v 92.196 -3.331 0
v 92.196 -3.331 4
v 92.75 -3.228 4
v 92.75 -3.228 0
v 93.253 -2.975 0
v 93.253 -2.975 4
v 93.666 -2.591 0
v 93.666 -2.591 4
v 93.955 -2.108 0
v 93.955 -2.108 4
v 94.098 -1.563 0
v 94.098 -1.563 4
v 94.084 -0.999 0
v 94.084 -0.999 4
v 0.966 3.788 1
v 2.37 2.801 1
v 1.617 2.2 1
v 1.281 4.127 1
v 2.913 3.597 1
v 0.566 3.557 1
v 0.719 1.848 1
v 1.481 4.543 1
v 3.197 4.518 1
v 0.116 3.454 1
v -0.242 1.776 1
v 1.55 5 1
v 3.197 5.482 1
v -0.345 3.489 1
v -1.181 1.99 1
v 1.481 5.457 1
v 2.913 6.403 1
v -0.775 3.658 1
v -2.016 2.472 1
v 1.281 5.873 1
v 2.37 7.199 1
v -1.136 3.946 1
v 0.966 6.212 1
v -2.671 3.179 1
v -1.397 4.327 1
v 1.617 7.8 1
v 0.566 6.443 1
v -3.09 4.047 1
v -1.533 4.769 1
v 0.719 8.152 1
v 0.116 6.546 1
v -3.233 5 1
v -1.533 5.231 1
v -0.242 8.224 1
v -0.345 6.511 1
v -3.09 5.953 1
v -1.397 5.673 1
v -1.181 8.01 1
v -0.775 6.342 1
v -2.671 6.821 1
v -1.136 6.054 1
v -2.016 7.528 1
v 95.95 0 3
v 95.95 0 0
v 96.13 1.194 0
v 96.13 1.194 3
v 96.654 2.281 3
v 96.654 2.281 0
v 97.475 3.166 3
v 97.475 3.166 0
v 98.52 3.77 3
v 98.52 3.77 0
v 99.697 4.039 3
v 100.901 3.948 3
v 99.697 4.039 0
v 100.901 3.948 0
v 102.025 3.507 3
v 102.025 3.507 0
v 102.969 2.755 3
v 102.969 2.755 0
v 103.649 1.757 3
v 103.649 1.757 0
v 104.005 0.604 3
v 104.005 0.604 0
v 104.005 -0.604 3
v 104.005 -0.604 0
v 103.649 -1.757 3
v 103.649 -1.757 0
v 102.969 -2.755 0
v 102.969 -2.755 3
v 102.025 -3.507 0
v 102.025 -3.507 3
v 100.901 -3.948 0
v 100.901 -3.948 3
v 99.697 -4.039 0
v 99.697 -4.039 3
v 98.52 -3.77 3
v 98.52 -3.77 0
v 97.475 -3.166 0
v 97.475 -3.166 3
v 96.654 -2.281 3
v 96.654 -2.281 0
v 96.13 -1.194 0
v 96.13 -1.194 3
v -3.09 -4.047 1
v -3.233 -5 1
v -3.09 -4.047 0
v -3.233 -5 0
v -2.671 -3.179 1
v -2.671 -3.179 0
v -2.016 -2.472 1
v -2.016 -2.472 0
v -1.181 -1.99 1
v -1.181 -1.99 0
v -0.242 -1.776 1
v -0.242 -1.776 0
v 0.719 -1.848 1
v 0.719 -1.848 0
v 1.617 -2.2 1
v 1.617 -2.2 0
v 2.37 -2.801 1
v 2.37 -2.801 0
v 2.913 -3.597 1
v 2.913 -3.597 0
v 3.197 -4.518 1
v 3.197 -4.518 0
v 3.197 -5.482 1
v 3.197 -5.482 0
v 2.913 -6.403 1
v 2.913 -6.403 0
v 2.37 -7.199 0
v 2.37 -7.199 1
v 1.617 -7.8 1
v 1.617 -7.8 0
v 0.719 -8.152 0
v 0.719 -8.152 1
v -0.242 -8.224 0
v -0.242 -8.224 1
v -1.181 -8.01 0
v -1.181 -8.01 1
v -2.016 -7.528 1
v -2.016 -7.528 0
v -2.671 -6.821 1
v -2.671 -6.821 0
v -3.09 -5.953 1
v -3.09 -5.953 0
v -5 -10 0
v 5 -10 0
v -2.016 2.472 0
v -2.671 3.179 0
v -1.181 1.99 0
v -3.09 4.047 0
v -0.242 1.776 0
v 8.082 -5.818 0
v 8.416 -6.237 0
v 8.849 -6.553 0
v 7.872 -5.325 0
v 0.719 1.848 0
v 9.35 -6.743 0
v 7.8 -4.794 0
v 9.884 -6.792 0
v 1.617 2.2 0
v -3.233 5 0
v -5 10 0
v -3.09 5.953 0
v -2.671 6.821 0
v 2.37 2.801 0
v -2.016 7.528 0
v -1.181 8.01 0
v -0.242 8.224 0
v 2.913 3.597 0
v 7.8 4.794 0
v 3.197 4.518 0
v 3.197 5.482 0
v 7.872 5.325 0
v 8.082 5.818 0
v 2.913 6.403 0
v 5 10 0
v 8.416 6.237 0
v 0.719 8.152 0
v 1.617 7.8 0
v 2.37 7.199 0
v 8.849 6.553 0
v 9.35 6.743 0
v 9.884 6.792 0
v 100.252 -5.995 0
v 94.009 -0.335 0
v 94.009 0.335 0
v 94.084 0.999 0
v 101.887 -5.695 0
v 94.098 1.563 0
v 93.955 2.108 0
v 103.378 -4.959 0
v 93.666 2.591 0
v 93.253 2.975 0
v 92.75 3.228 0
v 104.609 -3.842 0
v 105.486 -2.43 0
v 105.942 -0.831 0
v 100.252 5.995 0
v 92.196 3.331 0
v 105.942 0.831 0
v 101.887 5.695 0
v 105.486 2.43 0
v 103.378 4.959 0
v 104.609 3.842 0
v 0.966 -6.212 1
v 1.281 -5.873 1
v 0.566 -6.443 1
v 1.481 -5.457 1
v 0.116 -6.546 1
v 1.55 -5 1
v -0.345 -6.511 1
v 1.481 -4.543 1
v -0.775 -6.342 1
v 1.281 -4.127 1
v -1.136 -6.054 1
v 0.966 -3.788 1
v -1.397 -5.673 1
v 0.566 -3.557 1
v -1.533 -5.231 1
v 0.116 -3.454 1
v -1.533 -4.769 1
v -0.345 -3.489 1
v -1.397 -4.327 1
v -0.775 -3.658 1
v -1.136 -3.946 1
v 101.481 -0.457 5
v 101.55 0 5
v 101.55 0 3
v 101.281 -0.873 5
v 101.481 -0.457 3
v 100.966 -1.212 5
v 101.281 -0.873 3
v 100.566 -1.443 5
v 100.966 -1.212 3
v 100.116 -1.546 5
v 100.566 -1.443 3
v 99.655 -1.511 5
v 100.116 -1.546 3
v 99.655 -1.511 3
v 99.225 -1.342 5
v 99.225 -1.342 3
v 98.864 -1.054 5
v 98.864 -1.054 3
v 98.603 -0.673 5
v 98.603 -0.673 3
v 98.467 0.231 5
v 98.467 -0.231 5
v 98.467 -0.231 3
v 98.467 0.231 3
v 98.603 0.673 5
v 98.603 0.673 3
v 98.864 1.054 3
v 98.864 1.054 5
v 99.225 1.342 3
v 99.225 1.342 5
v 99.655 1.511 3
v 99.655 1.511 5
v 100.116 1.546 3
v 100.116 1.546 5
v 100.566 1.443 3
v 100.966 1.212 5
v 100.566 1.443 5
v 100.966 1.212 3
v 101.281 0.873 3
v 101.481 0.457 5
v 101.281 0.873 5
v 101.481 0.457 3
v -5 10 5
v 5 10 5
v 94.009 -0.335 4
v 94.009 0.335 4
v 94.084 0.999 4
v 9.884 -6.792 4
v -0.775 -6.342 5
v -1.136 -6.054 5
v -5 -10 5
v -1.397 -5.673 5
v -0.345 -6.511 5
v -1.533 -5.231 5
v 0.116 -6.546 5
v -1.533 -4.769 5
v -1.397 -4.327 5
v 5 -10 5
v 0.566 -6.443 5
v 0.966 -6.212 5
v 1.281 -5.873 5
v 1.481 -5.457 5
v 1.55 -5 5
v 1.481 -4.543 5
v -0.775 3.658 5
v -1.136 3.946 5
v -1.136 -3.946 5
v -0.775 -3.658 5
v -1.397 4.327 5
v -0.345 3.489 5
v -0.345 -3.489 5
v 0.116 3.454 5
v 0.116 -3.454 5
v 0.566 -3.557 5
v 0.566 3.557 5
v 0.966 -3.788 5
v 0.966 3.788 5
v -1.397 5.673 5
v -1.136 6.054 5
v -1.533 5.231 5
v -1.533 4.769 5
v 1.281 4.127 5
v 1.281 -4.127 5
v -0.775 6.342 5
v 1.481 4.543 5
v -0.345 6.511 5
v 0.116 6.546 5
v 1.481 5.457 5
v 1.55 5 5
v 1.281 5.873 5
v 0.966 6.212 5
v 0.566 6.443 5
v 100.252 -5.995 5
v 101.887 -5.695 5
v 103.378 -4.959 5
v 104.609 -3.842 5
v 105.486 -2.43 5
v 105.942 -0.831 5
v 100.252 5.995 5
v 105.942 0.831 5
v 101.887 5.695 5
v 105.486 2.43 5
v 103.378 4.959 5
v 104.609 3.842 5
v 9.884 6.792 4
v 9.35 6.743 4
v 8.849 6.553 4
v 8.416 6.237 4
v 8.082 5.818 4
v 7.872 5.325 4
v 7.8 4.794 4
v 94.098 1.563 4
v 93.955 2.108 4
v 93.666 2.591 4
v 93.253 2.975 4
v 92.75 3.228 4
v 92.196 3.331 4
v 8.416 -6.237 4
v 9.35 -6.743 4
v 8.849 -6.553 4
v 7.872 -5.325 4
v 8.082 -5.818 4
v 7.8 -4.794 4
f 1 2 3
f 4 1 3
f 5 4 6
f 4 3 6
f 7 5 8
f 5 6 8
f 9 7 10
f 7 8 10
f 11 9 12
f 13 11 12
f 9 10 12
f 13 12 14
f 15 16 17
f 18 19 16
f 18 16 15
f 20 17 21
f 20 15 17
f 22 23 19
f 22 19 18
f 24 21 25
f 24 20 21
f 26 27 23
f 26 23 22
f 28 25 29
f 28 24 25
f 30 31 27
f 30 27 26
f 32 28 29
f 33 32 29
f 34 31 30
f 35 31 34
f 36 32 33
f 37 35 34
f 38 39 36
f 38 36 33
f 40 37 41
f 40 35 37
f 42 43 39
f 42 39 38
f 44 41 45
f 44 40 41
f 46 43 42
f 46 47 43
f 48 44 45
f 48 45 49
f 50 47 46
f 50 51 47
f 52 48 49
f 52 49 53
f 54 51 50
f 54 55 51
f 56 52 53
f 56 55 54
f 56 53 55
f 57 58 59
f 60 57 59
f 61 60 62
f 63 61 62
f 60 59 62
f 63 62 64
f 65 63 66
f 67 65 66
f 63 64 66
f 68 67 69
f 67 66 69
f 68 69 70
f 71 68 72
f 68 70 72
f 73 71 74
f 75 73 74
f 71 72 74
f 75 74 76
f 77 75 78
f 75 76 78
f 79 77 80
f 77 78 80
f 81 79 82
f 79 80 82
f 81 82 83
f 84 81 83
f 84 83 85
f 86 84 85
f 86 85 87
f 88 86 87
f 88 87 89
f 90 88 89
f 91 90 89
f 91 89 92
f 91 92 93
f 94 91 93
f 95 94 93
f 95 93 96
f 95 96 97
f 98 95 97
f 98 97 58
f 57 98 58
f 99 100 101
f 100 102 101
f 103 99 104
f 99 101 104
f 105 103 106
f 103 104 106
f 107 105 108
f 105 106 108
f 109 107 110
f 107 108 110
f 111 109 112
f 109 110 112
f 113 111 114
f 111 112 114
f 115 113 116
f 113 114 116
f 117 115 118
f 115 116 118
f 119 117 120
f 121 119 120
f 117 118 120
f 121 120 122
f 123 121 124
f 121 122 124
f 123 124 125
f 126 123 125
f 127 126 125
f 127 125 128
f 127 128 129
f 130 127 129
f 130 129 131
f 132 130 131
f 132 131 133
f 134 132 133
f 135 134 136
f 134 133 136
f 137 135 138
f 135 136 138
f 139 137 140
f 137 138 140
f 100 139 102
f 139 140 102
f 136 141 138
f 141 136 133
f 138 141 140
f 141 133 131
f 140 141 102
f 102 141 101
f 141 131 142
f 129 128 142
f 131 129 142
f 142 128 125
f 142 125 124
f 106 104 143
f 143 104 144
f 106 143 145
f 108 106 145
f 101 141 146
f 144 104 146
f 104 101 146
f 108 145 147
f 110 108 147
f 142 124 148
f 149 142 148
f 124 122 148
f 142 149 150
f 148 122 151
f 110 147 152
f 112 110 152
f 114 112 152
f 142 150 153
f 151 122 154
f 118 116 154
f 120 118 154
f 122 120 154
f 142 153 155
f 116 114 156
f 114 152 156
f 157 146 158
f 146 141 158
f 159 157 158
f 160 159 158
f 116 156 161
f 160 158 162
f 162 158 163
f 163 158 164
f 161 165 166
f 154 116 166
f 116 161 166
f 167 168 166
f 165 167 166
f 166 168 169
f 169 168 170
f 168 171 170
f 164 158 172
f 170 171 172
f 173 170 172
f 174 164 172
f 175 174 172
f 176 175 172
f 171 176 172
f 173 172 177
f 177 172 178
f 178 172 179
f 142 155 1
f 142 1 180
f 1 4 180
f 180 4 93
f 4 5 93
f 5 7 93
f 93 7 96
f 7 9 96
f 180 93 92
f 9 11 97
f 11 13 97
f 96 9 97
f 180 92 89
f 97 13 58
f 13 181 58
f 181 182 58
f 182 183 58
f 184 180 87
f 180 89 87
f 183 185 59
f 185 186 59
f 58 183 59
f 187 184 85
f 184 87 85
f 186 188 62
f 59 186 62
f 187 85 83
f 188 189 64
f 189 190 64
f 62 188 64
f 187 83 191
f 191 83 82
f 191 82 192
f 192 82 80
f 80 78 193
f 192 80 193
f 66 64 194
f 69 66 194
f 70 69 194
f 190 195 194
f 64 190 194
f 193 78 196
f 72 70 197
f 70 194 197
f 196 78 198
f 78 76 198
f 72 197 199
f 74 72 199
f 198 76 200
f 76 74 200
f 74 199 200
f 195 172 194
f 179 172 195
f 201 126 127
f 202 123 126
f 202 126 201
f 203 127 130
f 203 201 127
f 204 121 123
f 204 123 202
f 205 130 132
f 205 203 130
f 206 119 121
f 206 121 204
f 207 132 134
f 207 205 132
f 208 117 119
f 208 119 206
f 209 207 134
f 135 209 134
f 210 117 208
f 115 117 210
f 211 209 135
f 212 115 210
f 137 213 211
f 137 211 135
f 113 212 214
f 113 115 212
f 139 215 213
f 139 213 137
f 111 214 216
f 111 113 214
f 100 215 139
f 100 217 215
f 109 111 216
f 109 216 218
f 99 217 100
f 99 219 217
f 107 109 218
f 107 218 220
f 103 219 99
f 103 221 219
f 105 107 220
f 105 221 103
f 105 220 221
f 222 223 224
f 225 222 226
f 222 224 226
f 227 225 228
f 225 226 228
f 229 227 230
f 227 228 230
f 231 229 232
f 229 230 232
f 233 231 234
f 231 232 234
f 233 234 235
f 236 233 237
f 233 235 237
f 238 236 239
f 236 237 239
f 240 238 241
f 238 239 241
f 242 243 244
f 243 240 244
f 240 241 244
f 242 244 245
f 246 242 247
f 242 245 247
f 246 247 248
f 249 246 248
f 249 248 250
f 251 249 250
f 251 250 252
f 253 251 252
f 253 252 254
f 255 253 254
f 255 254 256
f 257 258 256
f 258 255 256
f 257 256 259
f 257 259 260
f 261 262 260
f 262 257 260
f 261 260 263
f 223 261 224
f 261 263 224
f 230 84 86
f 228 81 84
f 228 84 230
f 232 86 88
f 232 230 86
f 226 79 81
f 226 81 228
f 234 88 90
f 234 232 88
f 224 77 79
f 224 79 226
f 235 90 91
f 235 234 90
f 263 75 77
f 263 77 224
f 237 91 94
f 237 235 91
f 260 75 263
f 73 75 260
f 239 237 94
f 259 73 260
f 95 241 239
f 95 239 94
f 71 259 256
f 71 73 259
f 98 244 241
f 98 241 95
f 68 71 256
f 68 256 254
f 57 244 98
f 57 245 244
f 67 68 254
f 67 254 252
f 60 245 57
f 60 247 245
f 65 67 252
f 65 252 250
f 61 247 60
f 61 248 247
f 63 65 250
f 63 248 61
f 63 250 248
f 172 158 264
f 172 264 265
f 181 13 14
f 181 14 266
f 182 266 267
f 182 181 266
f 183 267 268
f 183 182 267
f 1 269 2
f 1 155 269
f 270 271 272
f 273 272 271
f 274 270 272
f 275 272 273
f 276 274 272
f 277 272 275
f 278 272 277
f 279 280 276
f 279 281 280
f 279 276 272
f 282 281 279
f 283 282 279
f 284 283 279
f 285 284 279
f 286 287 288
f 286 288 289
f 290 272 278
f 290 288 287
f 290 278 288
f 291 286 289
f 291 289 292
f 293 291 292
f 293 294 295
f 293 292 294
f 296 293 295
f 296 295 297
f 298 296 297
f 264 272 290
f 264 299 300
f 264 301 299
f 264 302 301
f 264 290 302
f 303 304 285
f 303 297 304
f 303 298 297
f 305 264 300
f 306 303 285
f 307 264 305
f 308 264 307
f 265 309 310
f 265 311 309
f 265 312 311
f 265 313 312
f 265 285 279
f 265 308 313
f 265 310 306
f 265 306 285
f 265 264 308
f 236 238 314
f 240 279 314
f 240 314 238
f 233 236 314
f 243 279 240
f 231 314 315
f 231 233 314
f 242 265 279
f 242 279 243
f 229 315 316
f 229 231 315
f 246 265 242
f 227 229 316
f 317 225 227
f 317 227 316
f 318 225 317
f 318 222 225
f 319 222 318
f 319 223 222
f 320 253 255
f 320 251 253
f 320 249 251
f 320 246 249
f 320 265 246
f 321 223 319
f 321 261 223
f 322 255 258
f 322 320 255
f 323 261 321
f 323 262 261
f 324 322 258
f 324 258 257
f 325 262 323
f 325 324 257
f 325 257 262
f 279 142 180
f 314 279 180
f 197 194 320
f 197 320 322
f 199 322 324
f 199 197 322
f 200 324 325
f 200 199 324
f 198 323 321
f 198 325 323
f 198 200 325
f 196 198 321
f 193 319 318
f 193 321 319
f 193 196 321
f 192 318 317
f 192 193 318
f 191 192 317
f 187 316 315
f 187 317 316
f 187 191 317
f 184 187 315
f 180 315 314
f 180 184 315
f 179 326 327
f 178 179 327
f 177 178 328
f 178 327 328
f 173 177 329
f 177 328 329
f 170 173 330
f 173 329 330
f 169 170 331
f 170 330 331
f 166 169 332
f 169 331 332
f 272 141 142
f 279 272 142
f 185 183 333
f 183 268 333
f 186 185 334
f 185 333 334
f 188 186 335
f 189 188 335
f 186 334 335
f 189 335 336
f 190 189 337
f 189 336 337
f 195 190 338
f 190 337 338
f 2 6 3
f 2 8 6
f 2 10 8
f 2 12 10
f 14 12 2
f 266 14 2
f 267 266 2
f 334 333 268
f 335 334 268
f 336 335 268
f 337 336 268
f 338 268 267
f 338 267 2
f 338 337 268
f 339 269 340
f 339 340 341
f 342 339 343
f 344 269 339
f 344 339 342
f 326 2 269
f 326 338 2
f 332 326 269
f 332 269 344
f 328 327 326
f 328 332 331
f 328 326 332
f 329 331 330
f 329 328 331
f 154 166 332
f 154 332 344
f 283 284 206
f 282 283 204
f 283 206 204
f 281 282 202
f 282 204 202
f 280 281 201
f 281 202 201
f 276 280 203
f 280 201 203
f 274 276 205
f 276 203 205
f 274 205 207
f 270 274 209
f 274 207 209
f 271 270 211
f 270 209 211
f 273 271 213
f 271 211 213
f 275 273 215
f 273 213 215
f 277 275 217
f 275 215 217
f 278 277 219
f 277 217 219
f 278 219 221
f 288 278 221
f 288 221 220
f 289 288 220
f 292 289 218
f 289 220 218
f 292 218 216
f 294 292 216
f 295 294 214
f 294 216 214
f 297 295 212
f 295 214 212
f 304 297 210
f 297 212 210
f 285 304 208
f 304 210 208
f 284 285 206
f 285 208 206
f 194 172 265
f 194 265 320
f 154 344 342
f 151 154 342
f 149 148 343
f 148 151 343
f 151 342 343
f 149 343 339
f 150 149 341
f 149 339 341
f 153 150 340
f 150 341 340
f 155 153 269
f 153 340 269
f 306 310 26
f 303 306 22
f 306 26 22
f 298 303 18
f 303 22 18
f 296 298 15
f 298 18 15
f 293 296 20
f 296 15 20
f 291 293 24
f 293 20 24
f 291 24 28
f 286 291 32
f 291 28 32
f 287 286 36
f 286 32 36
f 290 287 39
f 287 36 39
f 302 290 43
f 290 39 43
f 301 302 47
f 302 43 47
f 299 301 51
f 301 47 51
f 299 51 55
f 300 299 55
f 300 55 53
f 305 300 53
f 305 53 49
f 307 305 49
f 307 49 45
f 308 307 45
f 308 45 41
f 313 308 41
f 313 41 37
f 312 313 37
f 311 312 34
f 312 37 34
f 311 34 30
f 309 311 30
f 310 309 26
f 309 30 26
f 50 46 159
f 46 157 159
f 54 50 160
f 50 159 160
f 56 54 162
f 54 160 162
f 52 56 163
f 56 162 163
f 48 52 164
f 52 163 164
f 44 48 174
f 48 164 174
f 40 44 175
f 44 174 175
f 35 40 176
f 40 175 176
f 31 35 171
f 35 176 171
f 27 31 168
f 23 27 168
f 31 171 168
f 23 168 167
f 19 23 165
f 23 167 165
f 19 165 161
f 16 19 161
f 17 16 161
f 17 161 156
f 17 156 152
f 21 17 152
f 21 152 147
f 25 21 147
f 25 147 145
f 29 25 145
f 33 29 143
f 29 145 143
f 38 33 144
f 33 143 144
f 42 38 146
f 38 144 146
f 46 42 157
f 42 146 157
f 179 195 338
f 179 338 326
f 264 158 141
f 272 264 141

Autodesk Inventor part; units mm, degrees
ref_plane "YZ Plane" through (0, 0, 0) normal (1, 0, 0) x (0, 1, 0)
ref_plane "XZ Plane" through (0, 0, 0) normal (0, 1, 0) x (-1, 0, 0)
ref_plane "XY Plane" through (0, 0, 0) normal (0, 0, 1) x (1, 0, 0)
sketch "スケッチ1" plane through (0, 0, 0) normal (0, 0, 1) x (1, 0, 0)
  circle A0 centre (0, 5) radius 1.55
  circle A1 centre (0, -5) radius 1.55
  line L0 (0, 5) -> (0, -5) construction
  line L1 (0, 0) -> (100, 0) construction
  circle A2 centre (100, 0) radius 1.55
  line L2 (-5, 10) -> (-5, -10)
  line L3 (-5, -10) -> (5, -10)
  line L4 (5, -10) -> (100.2521, -5.9947)
  line L5 (-5, 10) -> (5, 10)
  line L6 (5, 10) -> (100.2521, 5.9947)
  arc A3 (100.2521, -5.9947) -> (100.2521, 5.9947) centre (100, 0) ccw
  circle A4 centre (0, 5) radius 3 construction
  circle A5 centre (0, 5) radius 5 construction
  line L7 (5, 10) -> (5, -10) construction
  point P0 (-5, 0)
  dimension "d0" = 10
  dimension "d1" = 3.1
  dimension "d2" = 3.1
  dimension "d3" = 100
  dimension "d4" = 6
  dimension "d5" = 6
  dimension "d6" = 2
extrude "押し出し1" add sketch "スケッチ1" along normal blind 5
sketch "スケッチ2" plane through (0, 0, 0) normal (0, 0, -1) x (-1, 0, 0)
  circle A0 centre (-100, 0) radius 1.55 projected
  arc A1 (-100.2521, 5.9947) -> (-100.2521, -5.9947) centre (-100, 0) ccw projected
  circle A2 centre (-100, 0) radius 4.05
  point P0 (0, 0)
  dimension "d9" = 8.1
extrude "押し出し2" cut sketch "スケッチ2" against normal blind 3
sketch "スケッチ3" plane through (0, 0, 0) normal (0, 0, -1) x (-1, 0, 0)
  circle A0 centre (0, -5) radius 1.55 projected
  circle A1 centre (0, 5) radius 1.55 projected
  line L0 (0, -1.8246) -> (2.75, -3.4123)
  line L1 (2.75, -3.4123) -> (2.75, -6.5877)
  line L2 (2.75, -6.5877) -> (0, -8.1754)
  line L3 (0, -8.1754) -> (-2.75, -6.5877)
  line L4 (-2.75, -6.5877) -> (-2.75, -3.4123)
  line L5 (-2.75, -3.4123) -> (0, -1.8246)
  line L6 (-2.75, 6.5877) -> (0, 8.1754)
  line L7 (0, 8.1754) -> (2.75, 6.5877)
  line L8 (2.75, 6.5877) -> (2.75, 3.4123)
  line L9 (2.75, 3.4123) -> (0, 1.8246)
  line L10 (0, 1.8246) -> (-2.75, 3.4123)
  line L11 (-2.75, 3.4123) -> (-2.75, 6.5877)
  line L12 (0, -8.2332) -> (2.8, -6.6166)
  line L13 (2.8, -6.6166) -> (2.8, -3.3834)
  line L14 (2.8, -3.3834) -> (0, -1.7668)
  line L15 (0, -1.7668) -> (-2.8, -3.3834)
  line L16 (-2.8, -3.3834) -> (-2.8, -6.6166)
  line L17 (-2.8, -6.6166) -> (0, -8.2332)
  line L18 (-2.8, 3.3834) -> (0, 1.7668)
  line L19 (0, 1.7668) -> (2.8, 3.3834)
  line L20 (2.8, 3.3834) -> (2.8, 6.6166)
  line L21 (2.8, 6.6166) -> (0, 8.2332)
  line L22 (0, 8.2332) -> (-2.8, 6.6166)
  line L23 (-2.8, 6.6166) -> (-2.8, 3.3834)
  circle A2 centre (0, -7.1832) radius 1.05
  circle A3 centre (1.8907, -6.0916) radius 1.05
  circle A4 centre (1.8907, -3.9084) radius 1.05
  circle A5 centre (0, -2.8168) radius 1.05
  circle A6 centre (-1.8907, -3.9084) radius 1.05
  circle A7 centre (-1.8907, -6.0916) radius 1.05
  circle A8 centre (0, 2.8168) radius 1.05
  circle A9 centre (1.8907, 3.9084) radius 1.05
  circle A10 centre (1.8907, 6.0916) radius 1.05
  circle A11 centre (0, 7.1832) radius 1.05
  circle A12 centre (-1.8907, 6.0916) radius 1.05
  circle A13 centre (-1.8907, 3.9084) radius 1.05
  circle A14 centre (0, 5) radius 3.2332
  circle A15 centre (0, -5) radius 3.2332
  point P0 (0, 0)
  point P1 (2.8, -6.6166)
  point P2 (2.8, -3.3834)
  point P3 (0, -1.7668)
  point P4 (-2.8, -3.3834)
  point P5 (-2.8, -6.6166)
  point P6 (2.8, 3.3834)
  point P7 (2.8, 6.6166)
  point P8 (0, 8.2332)
  point P9 (-2.8, 6.6166)
  point P10 (-2.8, 3.3834)
  dimension "d16" = 2.1
  dimension "d15" = 5.5
  dimension "d17" = 0.05
  dimension "d20" = 360
  dimension "d24" = 360
extrude "押し出し3" cut sketch "スケッチ3" against normal blind 1
sketch "スケッチ4" plane through (0, 0, 0) normal (0, 0, -1) x (-1, 0, 0)
  circle A0 centre (-100, 0) radius 4.05 projected
  line L0 (-100.2521, 5.9947) -> (-5, 10) projected
  arc A1 (-100.2521, 5.9947) -> (-100.2521, -5.9947) centre (-100, 0) ccw projected
  line L1 (-5, -10) -> (-100.2521, -5.9947) projected
  line L2 (-7.8, -6.8796) -> (-94.9345, -3.2157)
  line L3 (-5, -10) -> (-100.2521, -5.9947) projected
  arc A2 (-94.9345, -3.2157) -> (-94.9345, 3.2157) centre (-100, 0) ccw
  line L4 (-94.9345, 3.2157) -> (-7.8, 6.8796)
  line L5 (-7.8, 6.8796) -> (-7.8, -6.8796)
  point P0 (-2.8, 4.4334)
  point P1 (0, 0)
  dimension "d26" = 3
  dimension "d27" = 3
  dimension "d28" = 5
extrude "押し出し4" cut sketch "スケッチ4" against normal blind 4 contours L2 A2 L4 L5
fillet "フィレット1" radius 2 4 edges at (7.8, 6.8796, 2) (7.8, -6.8796, 2) (94.9345, 3.2157, 2) (94.9345, -3.2157, 2)
equation "\"d27\" = d26"
properties part number "胴体_サブフレーム_1_12" material "アセタール樹脂、黒"
